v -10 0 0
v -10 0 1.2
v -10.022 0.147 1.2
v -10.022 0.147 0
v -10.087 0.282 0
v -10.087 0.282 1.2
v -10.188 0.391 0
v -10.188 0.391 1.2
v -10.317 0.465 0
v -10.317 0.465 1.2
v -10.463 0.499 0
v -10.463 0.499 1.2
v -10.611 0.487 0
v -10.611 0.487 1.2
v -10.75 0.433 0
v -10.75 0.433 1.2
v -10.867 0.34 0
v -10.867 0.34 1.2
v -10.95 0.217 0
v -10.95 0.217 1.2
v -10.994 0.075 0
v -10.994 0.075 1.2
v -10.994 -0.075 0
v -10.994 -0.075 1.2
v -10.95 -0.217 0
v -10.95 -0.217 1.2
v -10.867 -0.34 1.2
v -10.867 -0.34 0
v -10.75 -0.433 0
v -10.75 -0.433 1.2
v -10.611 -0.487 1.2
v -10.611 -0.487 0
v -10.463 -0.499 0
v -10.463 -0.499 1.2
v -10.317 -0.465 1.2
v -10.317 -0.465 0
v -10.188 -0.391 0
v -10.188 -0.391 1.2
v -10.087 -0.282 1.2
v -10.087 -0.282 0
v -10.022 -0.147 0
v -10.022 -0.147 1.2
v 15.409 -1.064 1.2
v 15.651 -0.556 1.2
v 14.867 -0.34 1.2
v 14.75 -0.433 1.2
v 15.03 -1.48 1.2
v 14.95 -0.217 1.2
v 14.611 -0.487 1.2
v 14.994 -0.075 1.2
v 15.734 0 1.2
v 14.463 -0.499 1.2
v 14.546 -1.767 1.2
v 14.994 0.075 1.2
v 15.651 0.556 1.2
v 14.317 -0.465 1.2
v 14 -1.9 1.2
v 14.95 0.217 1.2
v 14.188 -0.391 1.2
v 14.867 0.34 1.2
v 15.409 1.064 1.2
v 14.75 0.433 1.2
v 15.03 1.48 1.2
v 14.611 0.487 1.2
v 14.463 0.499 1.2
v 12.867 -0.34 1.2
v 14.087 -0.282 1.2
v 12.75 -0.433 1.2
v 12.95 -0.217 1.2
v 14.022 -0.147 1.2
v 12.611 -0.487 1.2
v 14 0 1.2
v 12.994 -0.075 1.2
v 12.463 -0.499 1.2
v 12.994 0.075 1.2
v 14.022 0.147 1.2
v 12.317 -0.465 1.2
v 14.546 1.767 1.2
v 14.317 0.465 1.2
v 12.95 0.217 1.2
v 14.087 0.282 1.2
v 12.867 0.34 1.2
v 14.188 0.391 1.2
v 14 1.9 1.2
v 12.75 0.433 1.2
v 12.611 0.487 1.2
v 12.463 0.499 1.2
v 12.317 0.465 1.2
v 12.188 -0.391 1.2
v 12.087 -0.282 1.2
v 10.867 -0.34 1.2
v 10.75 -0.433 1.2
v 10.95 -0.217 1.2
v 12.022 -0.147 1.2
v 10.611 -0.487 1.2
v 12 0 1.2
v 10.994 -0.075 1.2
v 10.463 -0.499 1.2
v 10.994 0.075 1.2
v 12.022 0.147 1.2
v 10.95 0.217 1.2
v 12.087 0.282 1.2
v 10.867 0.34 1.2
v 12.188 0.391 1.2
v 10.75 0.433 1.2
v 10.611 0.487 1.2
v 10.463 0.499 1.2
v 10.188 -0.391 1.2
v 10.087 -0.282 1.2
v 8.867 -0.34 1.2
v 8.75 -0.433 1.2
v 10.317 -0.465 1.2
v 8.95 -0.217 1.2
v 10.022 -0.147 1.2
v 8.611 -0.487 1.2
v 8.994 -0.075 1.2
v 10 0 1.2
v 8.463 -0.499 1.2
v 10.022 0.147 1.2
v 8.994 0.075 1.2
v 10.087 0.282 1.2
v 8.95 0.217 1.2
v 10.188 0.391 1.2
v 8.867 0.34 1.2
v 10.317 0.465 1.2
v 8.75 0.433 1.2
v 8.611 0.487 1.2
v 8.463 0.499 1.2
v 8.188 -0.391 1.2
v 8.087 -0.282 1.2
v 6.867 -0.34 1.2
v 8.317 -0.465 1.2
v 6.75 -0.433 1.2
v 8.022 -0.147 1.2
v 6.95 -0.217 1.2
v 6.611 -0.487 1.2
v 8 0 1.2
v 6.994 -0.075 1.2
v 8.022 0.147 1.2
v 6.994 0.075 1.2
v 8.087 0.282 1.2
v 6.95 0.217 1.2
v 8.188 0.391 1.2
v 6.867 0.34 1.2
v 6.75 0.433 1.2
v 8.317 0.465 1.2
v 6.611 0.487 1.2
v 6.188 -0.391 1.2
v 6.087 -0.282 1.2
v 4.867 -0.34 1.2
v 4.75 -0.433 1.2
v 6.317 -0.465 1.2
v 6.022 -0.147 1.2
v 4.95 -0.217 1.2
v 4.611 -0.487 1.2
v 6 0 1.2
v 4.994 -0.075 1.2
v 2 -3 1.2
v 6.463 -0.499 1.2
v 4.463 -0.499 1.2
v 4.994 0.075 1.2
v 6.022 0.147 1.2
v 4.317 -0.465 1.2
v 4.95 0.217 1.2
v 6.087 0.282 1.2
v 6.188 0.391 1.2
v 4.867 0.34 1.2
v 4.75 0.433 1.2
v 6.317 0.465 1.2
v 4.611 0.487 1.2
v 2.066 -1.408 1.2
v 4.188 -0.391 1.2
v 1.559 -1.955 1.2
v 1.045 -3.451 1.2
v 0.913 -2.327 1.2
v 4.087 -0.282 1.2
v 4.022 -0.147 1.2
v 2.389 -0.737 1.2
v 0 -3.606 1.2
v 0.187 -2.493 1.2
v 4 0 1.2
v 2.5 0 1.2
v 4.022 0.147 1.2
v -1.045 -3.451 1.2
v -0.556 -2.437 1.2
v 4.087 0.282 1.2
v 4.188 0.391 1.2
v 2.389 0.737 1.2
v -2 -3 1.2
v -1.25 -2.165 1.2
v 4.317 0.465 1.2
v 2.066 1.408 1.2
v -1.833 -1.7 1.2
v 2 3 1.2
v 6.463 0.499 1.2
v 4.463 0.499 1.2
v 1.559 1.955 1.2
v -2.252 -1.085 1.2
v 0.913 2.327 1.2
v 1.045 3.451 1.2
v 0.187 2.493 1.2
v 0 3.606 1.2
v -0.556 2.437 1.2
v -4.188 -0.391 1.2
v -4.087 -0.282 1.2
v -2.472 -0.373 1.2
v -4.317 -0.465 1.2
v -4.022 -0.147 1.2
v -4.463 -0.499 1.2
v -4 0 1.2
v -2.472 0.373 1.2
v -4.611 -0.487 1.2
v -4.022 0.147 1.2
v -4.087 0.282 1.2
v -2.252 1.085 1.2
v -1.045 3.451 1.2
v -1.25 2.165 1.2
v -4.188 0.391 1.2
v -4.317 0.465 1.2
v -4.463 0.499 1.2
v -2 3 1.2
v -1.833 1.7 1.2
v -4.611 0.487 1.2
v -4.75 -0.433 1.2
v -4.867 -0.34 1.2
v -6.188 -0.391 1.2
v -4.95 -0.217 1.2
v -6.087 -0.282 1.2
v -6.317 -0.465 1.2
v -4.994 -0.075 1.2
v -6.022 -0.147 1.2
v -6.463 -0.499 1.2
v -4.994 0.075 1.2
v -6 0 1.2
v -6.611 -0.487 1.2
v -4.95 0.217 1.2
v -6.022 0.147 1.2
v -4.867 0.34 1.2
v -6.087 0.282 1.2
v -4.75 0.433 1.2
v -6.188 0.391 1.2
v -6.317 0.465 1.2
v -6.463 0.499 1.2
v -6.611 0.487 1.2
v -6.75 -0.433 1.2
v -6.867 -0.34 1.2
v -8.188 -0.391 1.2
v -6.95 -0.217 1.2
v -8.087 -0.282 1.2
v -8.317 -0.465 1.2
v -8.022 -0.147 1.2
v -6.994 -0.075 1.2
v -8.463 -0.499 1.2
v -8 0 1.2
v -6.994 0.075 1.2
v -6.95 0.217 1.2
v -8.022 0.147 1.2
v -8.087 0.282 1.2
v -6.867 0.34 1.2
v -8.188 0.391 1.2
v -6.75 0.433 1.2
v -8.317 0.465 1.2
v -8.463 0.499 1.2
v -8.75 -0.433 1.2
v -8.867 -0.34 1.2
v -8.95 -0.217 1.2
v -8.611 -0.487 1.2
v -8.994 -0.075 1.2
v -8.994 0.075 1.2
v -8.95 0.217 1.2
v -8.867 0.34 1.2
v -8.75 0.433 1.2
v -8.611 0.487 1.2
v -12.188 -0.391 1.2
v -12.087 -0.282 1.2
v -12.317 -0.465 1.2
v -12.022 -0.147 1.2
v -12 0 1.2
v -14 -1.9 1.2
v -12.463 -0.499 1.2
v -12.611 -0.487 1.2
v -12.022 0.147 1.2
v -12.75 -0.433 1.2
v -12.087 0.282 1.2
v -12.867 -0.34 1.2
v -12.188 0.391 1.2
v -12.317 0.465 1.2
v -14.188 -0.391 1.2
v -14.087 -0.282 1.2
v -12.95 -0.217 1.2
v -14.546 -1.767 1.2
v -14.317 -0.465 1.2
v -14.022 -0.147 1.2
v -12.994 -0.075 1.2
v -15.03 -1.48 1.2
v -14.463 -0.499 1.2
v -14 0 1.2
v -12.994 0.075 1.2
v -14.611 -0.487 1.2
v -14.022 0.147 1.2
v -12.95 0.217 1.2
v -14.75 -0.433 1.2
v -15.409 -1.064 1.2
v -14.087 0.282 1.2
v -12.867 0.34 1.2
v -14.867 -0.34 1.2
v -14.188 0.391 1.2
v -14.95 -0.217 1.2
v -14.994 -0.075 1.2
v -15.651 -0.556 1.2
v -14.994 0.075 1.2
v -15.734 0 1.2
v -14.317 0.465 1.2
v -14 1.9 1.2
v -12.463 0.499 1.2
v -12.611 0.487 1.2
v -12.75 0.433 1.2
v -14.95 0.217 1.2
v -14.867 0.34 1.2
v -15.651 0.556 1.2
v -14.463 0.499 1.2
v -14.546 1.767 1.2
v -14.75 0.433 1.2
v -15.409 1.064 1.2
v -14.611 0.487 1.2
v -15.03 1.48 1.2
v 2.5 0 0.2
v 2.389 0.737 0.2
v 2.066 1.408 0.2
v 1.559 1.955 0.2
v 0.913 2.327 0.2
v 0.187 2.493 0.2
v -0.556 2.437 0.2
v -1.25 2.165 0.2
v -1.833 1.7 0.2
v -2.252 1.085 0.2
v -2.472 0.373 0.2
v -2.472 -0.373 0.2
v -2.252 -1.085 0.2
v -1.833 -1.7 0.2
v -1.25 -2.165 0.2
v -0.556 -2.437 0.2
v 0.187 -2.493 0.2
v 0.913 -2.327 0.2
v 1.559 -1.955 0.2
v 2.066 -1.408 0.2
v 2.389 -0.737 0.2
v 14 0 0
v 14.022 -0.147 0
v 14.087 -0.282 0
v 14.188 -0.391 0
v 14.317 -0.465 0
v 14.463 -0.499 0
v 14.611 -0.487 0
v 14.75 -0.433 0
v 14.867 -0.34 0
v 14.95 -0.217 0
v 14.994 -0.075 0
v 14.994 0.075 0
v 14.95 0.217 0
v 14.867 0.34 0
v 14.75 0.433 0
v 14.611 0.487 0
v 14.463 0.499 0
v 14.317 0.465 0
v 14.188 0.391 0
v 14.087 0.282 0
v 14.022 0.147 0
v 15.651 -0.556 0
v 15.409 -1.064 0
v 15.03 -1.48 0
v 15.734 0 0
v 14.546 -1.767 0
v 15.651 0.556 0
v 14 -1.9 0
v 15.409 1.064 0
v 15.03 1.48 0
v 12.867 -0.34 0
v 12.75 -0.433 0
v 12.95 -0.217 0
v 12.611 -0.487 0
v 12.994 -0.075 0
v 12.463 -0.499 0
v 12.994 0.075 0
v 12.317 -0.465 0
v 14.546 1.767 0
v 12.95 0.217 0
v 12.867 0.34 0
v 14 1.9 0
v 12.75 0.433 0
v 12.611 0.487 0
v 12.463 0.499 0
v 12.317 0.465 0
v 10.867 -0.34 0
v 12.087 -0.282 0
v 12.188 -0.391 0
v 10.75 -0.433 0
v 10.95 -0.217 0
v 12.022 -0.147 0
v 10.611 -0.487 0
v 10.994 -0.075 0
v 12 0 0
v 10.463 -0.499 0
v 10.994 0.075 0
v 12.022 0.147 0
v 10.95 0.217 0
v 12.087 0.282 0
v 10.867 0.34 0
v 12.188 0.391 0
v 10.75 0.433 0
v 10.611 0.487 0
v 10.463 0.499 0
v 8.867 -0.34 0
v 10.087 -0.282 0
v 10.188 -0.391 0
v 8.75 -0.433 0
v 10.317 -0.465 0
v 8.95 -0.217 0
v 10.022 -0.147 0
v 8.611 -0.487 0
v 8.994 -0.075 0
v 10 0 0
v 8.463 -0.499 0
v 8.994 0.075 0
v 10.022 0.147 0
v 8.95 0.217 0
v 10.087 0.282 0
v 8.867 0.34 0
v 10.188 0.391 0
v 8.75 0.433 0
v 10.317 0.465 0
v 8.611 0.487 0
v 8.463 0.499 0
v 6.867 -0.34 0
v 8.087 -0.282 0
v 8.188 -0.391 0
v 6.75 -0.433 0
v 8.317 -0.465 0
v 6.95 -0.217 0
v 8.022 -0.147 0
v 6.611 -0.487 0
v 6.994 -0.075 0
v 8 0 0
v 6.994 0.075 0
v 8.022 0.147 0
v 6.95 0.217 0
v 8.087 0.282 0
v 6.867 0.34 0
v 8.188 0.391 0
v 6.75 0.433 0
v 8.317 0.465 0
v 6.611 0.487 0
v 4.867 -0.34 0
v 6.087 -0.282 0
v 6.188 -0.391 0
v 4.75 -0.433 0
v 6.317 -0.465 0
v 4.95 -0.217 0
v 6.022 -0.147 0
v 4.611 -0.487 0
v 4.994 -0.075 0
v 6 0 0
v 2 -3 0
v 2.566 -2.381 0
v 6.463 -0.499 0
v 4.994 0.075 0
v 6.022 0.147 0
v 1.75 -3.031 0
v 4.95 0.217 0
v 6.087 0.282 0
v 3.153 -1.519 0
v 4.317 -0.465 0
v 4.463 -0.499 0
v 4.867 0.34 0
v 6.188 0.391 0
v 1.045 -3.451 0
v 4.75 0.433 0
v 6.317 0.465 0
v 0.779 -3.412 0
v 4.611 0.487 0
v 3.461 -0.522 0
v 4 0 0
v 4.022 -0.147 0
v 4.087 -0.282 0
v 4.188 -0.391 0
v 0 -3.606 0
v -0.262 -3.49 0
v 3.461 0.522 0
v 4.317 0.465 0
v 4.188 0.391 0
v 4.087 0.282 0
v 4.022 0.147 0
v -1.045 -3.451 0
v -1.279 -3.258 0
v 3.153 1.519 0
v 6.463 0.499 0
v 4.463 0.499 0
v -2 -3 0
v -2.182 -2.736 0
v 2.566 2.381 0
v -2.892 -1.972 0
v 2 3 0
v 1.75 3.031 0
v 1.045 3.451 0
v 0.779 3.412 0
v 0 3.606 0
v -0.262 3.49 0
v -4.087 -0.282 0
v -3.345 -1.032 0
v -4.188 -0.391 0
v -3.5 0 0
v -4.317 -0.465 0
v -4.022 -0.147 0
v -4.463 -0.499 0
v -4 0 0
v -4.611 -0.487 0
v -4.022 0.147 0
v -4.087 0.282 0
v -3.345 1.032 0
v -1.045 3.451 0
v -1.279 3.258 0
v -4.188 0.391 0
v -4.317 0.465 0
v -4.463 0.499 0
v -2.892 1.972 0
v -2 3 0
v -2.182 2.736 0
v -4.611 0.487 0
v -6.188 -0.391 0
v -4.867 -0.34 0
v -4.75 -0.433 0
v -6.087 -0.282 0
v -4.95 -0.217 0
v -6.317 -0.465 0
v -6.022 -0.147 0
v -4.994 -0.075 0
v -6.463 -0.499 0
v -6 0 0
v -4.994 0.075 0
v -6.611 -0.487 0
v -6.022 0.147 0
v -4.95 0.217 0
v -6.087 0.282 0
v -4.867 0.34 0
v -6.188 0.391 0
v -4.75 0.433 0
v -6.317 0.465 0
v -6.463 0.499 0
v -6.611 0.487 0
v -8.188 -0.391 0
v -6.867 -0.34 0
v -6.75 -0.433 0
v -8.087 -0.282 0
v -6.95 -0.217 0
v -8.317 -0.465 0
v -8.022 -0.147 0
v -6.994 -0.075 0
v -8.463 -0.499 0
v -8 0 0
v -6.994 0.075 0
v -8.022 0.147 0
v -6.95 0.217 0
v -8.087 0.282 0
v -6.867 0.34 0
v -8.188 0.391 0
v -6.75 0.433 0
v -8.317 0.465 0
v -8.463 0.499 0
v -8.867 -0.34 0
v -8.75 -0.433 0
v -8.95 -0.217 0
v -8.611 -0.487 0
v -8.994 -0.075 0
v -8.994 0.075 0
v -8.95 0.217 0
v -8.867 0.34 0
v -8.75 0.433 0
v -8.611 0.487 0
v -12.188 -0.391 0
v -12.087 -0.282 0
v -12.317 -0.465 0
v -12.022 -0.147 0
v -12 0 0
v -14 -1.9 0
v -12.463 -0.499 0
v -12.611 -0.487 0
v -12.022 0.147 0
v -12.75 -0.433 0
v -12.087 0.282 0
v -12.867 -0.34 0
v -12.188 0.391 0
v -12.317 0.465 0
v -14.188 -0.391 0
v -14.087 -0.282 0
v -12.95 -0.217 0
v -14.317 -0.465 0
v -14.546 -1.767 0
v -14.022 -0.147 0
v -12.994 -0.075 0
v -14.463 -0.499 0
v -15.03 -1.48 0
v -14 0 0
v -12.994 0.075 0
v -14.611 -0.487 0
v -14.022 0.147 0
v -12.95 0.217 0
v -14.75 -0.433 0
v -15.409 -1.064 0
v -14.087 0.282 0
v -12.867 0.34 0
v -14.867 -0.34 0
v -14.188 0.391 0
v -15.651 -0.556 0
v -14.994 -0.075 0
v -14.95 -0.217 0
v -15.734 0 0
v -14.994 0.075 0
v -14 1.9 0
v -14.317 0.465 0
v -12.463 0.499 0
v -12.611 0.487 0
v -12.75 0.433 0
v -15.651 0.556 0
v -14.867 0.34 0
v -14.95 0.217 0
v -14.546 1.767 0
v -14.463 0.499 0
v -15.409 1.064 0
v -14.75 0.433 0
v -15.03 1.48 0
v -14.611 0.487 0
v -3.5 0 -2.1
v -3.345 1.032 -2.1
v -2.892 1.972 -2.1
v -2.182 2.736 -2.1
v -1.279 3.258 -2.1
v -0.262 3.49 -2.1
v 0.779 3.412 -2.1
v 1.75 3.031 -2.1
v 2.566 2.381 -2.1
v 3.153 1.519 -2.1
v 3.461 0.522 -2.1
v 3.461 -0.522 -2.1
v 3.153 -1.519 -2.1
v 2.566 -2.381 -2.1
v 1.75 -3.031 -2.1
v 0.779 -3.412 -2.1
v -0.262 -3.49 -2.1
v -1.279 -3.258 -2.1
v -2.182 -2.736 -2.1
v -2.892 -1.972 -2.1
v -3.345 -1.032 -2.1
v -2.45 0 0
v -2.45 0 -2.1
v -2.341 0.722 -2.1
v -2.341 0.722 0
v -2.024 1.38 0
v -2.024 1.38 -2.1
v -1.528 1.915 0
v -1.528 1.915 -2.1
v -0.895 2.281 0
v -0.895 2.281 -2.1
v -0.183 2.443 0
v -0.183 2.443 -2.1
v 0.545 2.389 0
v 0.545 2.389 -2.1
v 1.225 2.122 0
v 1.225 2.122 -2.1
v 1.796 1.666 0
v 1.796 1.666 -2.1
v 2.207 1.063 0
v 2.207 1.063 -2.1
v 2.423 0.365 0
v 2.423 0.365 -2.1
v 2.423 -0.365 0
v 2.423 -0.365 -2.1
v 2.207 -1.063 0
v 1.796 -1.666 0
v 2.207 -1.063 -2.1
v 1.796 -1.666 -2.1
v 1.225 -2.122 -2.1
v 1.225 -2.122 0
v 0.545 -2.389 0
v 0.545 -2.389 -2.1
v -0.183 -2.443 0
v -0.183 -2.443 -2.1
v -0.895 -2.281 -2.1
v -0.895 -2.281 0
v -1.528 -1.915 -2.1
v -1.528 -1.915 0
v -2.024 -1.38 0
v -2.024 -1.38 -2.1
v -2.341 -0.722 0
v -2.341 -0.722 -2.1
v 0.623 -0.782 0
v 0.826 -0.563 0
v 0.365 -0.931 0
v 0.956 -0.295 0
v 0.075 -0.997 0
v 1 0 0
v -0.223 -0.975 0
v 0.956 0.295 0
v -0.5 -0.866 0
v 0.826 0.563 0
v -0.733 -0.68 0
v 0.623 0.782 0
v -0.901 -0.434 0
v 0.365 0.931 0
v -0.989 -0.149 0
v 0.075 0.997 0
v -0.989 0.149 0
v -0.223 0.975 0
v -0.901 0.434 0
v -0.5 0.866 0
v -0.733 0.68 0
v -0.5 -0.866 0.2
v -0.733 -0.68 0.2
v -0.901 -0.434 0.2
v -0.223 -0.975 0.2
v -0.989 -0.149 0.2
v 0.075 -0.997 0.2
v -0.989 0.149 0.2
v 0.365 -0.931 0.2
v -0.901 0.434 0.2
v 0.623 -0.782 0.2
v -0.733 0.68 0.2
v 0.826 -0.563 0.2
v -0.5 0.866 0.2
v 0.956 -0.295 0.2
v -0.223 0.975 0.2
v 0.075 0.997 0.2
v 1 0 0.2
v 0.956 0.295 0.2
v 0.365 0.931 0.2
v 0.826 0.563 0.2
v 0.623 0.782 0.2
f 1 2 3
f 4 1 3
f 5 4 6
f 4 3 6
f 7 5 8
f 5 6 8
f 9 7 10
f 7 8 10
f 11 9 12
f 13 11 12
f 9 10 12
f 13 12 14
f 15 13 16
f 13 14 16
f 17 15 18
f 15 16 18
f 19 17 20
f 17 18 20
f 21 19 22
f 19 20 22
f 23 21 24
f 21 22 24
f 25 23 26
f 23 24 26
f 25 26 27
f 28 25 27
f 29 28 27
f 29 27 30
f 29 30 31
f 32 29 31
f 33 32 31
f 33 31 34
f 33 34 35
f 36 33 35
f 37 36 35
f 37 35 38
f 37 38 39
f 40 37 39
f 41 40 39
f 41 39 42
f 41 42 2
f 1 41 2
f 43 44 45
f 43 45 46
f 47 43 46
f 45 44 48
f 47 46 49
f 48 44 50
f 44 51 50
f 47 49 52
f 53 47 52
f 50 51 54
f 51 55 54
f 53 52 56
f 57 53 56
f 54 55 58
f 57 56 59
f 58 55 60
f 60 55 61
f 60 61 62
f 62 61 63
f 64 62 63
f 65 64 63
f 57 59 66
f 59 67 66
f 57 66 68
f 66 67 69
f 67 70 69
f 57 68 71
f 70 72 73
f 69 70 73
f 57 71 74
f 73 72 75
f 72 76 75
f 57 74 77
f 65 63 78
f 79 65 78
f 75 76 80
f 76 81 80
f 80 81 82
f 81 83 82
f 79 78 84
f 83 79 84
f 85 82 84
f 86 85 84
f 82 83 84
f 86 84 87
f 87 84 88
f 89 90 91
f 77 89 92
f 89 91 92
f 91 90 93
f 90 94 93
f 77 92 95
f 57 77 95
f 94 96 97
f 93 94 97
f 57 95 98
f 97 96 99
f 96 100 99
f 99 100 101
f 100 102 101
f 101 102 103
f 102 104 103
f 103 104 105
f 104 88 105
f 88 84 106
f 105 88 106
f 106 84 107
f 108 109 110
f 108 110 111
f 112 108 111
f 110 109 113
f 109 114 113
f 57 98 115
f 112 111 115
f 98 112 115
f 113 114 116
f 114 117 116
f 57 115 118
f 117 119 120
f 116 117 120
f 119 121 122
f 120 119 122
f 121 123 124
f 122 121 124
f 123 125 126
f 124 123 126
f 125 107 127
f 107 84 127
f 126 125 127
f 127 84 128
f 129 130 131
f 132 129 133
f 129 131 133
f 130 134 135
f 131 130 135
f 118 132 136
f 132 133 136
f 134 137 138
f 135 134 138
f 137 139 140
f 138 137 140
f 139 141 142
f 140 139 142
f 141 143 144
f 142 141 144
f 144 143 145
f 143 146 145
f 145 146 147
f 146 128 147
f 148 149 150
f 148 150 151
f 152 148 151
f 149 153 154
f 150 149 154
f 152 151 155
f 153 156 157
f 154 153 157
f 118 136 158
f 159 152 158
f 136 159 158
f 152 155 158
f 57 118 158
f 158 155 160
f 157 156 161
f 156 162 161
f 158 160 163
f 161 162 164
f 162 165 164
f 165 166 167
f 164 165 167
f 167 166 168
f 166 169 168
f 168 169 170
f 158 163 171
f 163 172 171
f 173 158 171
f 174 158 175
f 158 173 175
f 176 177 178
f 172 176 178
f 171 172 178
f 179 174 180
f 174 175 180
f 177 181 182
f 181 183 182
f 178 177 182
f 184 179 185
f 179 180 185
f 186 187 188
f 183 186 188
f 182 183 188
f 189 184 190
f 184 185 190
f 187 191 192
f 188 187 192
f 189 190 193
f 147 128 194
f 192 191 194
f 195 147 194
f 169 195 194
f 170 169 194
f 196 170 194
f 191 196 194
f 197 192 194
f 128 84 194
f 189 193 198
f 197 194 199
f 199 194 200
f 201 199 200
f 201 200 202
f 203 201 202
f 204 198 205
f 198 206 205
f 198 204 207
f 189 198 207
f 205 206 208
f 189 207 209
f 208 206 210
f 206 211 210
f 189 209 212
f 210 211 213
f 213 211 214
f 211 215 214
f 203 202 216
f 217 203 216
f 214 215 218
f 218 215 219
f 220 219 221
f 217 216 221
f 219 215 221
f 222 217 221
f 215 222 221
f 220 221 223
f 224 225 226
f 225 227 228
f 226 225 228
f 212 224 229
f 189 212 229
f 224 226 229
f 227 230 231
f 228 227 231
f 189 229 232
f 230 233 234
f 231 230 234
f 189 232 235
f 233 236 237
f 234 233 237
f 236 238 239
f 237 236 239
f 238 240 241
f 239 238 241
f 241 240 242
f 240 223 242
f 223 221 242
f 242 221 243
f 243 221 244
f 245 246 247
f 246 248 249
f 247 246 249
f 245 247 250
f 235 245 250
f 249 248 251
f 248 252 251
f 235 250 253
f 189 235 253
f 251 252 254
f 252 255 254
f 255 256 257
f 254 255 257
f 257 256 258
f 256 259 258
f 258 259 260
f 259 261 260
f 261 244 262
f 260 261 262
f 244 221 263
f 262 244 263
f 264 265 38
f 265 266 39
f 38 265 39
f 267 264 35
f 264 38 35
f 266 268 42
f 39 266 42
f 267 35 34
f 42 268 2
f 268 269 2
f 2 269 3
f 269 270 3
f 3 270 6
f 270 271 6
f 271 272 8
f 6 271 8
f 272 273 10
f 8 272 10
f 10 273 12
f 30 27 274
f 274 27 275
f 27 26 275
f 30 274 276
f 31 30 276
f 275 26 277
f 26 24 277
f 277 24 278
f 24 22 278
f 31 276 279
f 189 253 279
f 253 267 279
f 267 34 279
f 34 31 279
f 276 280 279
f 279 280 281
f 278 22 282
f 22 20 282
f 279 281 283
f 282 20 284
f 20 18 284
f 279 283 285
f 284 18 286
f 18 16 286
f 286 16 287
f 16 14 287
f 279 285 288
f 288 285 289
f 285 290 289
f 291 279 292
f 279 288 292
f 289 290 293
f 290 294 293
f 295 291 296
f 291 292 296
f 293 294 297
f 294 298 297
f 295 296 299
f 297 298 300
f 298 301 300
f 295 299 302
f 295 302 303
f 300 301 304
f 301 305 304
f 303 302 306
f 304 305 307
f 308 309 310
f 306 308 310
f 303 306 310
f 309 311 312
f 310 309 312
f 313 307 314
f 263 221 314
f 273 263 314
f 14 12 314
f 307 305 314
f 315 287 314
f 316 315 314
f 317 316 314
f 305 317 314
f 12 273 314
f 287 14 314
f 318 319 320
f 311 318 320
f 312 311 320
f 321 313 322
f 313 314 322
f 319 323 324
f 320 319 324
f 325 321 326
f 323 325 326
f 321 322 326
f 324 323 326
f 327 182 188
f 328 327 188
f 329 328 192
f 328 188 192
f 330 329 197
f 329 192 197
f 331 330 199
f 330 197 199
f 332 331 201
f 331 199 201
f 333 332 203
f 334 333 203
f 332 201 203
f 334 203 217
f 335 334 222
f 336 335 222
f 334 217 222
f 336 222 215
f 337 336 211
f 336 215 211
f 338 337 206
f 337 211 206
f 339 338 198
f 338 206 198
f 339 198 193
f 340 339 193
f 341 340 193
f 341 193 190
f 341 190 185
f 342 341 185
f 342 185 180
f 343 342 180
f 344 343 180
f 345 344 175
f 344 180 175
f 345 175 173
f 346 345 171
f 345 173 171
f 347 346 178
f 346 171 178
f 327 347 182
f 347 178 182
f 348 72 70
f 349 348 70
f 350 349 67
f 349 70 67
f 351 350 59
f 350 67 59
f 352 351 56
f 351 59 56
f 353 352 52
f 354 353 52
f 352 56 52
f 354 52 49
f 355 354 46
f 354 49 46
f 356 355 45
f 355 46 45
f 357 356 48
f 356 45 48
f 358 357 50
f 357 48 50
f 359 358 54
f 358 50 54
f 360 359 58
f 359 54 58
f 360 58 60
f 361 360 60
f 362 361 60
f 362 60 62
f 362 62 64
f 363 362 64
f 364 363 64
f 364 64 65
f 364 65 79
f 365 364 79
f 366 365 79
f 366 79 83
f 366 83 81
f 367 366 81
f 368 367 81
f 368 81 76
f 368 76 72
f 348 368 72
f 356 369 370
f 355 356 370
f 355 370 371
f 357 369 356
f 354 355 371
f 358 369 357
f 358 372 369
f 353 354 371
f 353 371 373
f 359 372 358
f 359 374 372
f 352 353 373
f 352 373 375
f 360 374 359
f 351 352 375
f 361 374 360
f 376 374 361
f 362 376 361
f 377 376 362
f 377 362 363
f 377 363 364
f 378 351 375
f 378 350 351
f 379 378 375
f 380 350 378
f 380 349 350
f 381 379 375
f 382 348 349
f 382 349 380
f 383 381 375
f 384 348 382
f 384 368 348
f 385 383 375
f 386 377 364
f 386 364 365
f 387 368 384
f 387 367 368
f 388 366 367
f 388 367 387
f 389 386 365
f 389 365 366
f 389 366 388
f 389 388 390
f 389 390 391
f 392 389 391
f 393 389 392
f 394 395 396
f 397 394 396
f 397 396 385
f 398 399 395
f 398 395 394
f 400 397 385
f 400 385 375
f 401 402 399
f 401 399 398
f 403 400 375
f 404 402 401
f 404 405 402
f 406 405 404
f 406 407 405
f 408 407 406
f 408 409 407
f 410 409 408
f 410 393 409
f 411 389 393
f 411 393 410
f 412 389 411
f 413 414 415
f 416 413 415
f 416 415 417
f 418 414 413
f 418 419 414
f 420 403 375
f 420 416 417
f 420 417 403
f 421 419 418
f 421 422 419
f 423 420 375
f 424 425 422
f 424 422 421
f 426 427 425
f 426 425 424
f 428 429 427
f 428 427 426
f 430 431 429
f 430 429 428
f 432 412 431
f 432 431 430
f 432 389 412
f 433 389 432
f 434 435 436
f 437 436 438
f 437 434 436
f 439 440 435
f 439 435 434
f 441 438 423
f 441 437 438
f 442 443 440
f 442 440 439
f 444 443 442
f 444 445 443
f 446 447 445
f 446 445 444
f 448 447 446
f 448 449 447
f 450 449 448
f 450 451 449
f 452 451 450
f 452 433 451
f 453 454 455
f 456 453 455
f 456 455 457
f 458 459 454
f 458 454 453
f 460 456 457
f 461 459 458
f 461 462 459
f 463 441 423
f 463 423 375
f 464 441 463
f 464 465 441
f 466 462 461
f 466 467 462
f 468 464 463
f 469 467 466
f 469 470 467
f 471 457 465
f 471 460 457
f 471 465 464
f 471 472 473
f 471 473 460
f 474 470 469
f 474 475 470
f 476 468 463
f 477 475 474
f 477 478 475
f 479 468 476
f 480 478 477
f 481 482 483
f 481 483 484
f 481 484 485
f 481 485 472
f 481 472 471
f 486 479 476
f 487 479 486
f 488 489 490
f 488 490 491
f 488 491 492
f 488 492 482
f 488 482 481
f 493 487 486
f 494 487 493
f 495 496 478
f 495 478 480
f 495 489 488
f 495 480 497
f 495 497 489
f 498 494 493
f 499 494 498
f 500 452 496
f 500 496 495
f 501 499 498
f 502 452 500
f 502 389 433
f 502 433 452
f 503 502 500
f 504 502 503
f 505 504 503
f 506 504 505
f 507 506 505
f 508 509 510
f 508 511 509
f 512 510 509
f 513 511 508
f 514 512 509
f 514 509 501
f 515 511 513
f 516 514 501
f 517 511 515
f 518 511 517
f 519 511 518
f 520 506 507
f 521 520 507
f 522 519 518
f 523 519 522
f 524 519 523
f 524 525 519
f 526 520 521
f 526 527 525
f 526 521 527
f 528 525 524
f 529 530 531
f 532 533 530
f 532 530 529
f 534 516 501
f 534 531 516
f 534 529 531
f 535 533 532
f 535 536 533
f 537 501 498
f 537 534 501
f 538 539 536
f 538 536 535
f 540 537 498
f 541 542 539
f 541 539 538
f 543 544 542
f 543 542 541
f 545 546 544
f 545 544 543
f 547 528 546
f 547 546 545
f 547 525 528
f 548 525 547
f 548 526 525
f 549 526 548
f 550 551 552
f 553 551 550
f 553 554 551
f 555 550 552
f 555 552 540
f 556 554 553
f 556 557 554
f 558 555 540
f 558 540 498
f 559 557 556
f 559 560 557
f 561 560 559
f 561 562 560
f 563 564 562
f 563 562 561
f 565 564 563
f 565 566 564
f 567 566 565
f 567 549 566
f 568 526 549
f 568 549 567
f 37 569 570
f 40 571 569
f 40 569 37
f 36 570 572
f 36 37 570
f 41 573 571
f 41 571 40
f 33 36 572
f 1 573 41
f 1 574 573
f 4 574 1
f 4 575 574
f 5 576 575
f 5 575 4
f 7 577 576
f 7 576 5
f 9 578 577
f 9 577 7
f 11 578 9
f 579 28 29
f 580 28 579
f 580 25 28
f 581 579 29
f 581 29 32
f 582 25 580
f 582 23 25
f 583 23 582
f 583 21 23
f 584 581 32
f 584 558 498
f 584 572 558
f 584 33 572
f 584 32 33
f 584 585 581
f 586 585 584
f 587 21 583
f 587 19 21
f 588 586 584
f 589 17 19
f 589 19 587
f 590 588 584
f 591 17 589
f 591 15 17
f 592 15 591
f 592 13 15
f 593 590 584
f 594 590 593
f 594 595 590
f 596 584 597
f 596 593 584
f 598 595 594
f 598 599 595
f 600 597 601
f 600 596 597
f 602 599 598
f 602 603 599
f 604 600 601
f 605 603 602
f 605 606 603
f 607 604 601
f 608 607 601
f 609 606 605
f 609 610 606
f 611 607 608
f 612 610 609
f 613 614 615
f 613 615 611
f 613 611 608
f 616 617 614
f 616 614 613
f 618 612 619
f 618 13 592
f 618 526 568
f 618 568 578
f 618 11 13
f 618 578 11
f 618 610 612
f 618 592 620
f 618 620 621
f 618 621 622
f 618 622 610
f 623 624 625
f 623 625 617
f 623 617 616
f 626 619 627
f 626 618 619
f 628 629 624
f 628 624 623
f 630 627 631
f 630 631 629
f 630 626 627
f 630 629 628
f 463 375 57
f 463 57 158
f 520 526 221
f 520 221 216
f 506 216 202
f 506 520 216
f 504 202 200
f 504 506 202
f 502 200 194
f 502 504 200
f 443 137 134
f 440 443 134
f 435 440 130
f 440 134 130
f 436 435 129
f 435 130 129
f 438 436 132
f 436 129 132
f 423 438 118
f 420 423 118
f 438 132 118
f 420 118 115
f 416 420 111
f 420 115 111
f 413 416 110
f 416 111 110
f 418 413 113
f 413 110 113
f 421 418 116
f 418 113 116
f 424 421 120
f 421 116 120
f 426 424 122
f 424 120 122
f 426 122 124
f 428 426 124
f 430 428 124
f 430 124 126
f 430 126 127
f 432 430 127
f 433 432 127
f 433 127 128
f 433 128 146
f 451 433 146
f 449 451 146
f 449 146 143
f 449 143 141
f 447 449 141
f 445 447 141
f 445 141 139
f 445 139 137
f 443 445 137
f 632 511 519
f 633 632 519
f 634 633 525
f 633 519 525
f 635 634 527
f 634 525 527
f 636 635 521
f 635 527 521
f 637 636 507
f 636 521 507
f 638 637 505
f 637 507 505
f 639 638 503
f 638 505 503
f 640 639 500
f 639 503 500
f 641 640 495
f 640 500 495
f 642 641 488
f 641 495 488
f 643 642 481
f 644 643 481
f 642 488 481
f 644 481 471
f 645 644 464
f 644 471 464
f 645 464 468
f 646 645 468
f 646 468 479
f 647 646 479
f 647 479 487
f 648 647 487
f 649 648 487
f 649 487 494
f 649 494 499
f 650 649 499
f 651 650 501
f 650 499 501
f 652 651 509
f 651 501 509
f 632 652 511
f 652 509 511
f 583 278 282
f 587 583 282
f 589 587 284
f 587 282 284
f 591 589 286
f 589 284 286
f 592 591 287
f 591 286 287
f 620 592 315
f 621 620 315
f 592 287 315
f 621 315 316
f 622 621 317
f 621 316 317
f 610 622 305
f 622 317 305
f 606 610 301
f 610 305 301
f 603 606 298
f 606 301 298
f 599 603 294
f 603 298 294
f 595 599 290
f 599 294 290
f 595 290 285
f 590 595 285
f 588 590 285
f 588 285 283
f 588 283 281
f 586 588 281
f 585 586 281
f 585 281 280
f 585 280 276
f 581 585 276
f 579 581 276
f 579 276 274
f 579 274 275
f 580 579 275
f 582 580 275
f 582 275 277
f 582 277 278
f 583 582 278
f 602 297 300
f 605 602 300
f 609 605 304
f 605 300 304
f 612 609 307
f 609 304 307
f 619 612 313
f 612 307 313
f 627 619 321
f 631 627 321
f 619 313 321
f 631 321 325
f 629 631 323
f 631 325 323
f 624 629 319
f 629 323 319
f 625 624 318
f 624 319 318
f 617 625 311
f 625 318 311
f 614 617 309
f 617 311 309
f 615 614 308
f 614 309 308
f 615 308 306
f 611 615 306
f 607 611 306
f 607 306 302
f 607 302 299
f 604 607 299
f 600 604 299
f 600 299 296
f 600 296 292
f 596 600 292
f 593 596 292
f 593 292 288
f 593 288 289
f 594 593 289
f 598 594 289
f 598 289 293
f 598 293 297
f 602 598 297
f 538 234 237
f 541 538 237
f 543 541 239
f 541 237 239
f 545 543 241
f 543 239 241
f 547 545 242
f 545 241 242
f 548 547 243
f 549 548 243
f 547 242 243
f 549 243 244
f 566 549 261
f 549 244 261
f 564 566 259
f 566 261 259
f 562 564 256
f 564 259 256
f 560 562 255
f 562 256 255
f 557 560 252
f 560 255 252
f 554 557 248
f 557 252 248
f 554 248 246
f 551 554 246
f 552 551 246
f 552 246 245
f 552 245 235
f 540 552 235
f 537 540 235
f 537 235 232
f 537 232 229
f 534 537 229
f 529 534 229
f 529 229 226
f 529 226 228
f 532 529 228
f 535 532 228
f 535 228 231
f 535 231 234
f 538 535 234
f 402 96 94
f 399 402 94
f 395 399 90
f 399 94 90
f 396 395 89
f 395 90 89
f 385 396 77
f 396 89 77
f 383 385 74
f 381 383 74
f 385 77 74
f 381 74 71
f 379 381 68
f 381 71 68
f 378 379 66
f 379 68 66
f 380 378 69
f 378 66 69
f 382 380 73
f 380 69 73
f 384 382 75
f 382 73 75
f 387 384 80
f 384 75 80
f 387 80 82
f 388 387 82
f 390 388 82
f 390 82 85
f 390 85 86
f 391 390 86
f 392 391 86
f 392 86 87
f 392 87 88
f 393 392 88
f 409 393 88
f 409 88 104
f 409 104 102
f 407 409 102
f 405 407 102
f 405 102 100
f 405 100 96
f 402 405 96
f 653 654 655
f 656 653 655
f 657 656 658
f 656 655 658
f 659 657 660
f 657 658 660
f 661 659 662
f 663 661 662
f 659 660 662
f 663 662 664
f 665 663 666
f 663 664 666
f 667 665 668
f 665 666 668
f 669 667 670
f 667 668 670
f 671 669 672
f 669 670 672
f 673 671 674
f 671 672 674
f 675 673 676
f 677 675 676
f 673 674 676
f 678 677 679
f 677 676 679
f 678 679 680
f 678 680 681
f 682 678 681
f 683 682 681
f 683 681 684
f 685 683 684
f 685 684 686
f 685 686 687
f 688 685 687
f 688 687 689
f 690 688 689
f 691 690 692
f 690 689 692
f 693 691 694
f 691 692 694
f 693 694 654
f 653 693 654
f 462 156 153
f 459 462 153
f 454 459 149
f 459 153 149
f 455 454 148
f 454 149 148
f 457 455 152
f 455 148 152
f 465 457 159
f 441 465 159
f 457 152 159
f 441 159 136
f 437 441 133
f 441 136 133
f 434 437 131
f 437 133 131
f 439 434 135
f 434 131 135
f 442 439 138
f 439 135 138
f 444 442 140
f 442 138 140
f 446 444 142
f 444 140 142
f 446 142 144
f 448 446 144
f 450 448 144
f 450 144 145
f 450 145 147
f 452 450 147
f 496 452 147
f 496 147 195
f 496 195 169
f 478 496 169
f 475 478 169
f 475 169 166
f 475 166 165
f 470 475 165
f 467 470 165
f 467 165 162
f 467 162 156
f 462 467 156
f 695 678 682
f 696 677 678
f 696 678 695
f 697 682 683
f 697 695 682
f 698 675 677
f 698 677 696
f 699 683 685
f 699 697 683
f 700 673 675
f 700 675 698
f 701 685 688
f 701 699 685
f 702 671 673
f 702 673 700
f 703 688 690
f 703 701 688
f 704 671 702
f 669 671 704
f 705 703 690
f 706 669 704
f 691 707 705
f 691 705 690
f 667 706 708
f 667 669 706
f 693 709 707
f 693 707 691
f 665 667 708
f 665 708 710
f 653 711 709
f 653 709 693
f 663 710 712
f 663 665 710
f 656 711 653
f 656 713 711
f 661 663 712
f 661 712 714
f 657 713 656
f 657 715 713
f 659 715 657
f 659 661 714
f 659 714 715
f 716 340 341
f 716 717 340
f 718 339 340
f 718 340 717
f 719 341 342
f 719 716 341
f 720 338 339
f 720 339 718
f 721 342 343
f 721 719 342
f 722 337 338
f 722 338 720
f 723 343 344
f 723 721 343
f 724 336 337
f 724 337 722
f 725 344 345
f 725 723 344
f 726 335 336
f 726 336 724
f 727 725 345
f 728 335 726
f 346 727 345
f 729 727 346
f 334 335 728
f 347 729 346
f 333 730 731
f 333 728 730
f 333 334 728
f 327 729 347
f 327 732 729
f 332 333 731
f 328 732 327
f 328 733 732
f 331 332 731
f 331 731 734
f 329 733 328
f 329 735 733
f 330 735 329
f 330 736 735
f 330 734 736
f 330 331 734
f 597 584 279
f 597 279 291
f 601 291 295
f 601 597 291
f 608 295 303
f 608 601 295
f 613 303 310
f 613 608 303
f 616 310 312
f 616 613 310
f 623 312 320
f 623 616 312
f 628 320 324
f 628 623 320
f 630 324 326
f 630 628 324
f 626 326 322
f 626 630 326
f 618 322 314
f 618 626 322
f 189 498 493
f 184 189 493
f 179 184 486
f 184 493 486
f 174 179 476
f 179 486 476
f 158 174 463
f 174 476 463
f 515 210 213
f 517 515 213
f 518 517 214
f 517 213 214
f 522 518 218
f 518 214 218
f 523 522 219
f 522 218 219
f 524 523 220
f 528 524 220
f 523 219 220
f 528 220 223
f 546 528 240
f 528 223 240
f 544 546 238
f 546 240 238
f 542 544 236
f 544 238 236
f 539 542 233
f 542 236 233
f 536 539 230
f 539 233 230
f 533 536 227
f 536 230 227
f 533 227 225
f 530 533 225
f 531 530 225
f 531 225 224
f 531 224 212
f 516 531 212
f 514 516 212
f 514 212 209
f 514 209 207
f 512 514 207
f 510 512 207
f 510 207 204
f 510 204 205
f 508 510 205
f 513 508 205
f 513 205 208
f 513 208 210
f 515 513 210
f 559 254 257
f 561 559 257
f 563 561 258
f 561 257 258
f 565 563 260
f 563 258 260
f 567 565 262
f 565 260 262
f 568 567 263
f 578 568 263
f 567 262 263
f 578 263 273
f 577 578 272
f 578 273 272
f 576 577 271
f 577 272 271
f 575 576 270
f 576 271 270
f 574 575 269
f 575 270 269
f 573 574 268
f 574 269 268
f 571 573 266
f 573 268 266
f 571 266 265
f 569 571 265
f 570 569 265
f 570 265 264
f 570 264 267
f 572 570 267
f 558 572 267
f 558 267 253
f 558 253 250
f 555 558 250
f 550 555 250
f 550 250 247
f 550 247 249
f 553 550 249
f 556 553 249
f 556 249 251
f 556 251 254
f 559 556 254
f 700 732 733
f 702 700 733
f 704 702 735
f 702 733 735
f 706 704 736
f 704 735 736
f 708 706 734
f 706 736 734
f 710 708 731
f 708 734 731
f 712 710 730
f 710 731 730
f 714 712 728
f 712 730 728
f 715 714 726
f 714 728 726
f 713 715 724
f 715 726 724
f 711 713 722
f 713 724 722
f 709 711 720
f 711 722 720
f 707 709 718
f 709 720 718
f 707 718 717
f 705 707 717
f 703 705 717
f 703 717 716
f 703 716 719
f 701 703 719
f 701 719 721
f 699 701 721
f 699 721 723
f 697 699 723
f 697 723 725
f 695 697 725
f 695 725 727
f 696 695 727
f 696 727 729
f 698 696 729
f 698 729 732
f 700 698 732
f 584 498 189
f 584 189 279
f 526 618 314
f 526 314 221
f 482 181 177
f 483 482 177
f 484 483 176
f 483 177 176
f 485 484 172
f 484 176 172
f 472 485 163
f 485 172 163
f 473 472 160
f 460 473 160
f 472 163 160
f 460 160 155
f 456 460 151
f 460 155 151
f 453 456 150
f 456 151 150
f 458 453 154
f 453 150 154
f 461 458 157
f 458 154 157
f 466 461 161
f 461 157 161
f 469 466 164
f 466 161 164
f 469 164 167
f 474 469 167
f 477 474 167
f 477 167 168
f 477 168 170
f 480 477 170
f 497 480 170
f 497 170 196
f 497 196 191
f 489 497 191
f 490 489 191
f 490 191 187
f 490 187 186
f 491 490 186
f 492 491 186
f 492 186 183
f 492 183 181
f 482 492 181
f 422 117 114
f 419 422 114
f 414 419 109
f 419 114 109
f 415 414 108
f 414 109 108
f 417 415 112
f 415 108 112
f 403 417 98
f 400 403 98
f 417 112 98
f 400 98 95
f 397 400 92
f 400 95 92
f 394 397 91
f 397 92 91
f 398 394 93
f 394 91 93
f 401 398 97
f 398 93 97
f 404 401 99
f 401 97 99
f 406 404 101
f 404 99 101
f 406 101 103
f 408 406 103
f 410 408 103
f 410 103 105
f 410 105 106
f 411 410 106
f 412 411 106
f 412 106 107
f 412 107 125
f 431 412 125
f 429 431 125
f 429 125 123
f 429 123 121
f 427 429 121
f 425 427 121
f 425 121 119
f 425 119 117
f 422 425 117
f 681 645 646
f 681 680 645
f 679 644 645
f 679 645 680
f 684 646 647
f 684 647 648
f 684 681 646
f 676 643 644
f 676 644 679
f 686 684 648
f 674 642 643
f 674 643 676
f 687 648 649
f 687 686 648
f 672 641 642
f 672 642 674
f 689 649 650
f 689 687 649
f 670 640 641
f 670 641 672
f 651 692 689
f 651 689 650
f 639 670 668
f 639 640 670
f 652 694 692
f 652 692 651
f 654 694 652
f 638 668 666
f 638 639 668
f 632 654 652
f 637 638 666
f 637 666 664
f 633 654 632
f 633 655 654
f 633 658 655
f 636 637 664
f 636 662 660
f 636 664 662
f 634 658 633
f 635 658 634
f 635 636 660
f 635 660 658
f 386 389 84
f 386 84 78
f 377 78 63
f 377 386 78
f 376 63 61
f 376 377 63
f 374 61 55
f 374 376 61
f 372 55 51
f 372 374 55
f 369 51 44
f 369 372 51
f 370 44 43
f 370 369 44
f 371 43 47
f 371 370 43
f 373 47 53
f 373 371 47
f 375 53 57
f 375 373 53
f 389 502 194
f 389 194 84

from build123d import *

# Parameters (mm, degrees)
BOSS_EXTRUDE1_DEPTH = 1.2
SKETCH2_R           = 3.5
BOSS_EXTRUDE2_DEPTH = 2.1
SKETCH3_R           = 2.5
CUT_EXTRUDE1_DEPTH  = 1
SKETCH4_R           = 1
CUT_EXTRUDE2_DEPTH  = 19.149516235
SKETCH6_R           = 2.45
CUT_EXTRUDE3_DEPTH  = 2.1
SKETCH7_R           = 0.5
CUT_EXTRUDE4_DEPTH  = 19.303140156
SKETCH8_R           = 0.5
CUT_EXTRUDE5_DEPTH  = 19.303140156
CUT_EXTRUDE6_DEPTH  = 10


with BuildPart() as part:
    # Sketch1 → Boss-Extrude1 (new body)
    with BuildSketch(Plane.XY):
        with BuildLine():
            Line((-2, -6.75), (-2, -3))
            Line((-2, -3), (-14, -1.9))
            ThreePointArc((-14, -1.9), (-15.733799273, 0), (-14, 1.9))
            Line((-14, 1.9), (-2, 3))
            Line((-2, 3), (-2, 6.75))
            ThreePointArc((-2, 6.75), (0, 8.75), (2, 6.75))
            Line((2, 6.75), (2, 3))
            Line((2, 3), (14, 1.9))
            ThreePointArc((14, 1.9), (15.733799273, 0), (14, -1.9))
            Line((14, -1.9), (2, -3))
            Line((2, -3), (2, -6.75))
            ThreePointArc((2, -6.75), (0, -8.75), (-2, -6.75))
        make_face()
    extrude(amount=BOSS_EXTRUDE1_DEPTH)

    # Sketch2 → Boss-Extrude2 (add)
    with BuildSketch(Plane(origin=(0, 0, 0), x_dir=(-1, 0, 0), z_dir=(0, 0, -1))):
        Circle(SKETCH2_R)
    extrude(amount=BOSS_EXTRUDE2_DEPTH)

    # Sketch3 → Cut-Extrude1 (cut)
    with BuildSketch(Plane.XY.offset(1.2)):
        Circle(SKETCH3_R)
    extrude(amount=-CUT_EXTRUDE1_DEPTH, mode=Mode.SUBTRACT)

    # Sketch4 → Cut-Extrude2 (cut, through all)
    with BuildSketch(Plane.XY.offset(0.2)):
        Circle(SKETCH4_R)
    extrude(amount=-CUT_EXTRUDE2_DEPTH, mode=Mode.SUBTRACT)

    # Sketch6 → Cut-Extrude3 (cut)
    with BuildSketch(Plane(origin=(0, 0, -2.1), x_dir=(-1, 0, 0), z_dir=(0, 0, -1))):
        Circle(SKETCH6_R)
    extrude(amount=-CUT_EXTRUDE3_DEPTH, mode=Mode.SUBTRACT)

    # Sketch7 → Cut-Extrude4 (cut, through all)
    with BuildSketch(Plane.XY.offset(1.2)):
        with Locations((0, -4.5)):
            Circle(SKETCH7_R)
        with Locations((0, -6.5)):
            Circle(SKETCH7_R)
        with Locations((0, 4.5)):
            Circle(SKETCH7_R)
        with Locations((0, 6.5)):
            Circle(SKETCH7_R)
    extrude(amount=-CUT_EXTRUDE4_DEPTH, mode=Mode.SUBTRACT)

    # Sketch8 → Cut-Extrude5 (cut, through all)
    with BuildSketch(Plane.XY.offset(1.2)):
        with Locations((-4.5, 0)):
            Circle(SKETCH8_R)
        with Locations((-6.5, 0)):
            Circle(SKETCH8_R)
        with Locations((-8.5, 0)):
            Circle(SKETCH8_R)
        with Locations((-10.5, 0)):
            Circle(SKETCH8_R)
        with Locations((-12.5, 0)):
            Circle(SKETCH8_R)
        with Locations((-14.5, 0)):
            Circle(SKETCH8_R)
        with Locations(Location((4.5, 0, 0), (0, 0, 180))):
            Circle(SKETCH8_R)
        with Locations(Location((6.5, 0, 0), (0, 0, 180))):
            Circle(SKETCH8_R)
        with Locations(Location((8.5, 0, 0), (0, 0, 180))):
            Circle(SKETCH8_R)
        with Locations(Location((10.5, 0, 0), (0, 0, 180))):
            Circle(SKETCH8_R)
        with Locations(Location((12.5, 0, 0), (0, 0, 180))):
            Circle(SKETCH8_R)
        with Locations(Location((14.5, 0, 0), (0, 0, 180))):
            Circle(SKETCH8_R)
    extrude(amount=-CUT_EXTRUDE5_DEPTH, mode=Mode.SUBTRACT)

    # Sketch10 → Cut-Extrude6 (cut)
    with BuildSketch(Plane(origin=(0, 0, 0), x_dir=(-1, 0, 0), z_dir=(0, 0, -1))):
        with BuildLine():
            Line((-2, 3), (-3.5, 8.058048999))
            Line((-3.5, 8.058048999), (0.410688034, 10.263711762))
            Line((0.410688034, 10.263711762), (4.972399658, 6.328608878))
            Line((4.972399658, 6.328608878), (2, 3))
            ThreePointArc((2, 3), (0, 3.605551275), (-2, 3))
        make_face()
        with BuildLine():
            Line((-2, -3), (-3.79905406, -6.652770289))
            Line((-3.79905406, -6.652770289), (-0.630835306, -10.284036399))
            Line((-0.630835306, -10.284036399), (2.565835598, -9.787591171))
            Line((2.565835598, -9.787591171), (3.731558209, -4.826385145))
            Line((3.731558209, -4.826385145), (2, -3))
            ThreePointArc((2, -3), (0, -3.605551275), (-2, -3))
        make_face()
    extrude(amount=-CUT_EXTRUDE6_DEPTH, mode=Mode.SUBTRACT)


solid = part.part
